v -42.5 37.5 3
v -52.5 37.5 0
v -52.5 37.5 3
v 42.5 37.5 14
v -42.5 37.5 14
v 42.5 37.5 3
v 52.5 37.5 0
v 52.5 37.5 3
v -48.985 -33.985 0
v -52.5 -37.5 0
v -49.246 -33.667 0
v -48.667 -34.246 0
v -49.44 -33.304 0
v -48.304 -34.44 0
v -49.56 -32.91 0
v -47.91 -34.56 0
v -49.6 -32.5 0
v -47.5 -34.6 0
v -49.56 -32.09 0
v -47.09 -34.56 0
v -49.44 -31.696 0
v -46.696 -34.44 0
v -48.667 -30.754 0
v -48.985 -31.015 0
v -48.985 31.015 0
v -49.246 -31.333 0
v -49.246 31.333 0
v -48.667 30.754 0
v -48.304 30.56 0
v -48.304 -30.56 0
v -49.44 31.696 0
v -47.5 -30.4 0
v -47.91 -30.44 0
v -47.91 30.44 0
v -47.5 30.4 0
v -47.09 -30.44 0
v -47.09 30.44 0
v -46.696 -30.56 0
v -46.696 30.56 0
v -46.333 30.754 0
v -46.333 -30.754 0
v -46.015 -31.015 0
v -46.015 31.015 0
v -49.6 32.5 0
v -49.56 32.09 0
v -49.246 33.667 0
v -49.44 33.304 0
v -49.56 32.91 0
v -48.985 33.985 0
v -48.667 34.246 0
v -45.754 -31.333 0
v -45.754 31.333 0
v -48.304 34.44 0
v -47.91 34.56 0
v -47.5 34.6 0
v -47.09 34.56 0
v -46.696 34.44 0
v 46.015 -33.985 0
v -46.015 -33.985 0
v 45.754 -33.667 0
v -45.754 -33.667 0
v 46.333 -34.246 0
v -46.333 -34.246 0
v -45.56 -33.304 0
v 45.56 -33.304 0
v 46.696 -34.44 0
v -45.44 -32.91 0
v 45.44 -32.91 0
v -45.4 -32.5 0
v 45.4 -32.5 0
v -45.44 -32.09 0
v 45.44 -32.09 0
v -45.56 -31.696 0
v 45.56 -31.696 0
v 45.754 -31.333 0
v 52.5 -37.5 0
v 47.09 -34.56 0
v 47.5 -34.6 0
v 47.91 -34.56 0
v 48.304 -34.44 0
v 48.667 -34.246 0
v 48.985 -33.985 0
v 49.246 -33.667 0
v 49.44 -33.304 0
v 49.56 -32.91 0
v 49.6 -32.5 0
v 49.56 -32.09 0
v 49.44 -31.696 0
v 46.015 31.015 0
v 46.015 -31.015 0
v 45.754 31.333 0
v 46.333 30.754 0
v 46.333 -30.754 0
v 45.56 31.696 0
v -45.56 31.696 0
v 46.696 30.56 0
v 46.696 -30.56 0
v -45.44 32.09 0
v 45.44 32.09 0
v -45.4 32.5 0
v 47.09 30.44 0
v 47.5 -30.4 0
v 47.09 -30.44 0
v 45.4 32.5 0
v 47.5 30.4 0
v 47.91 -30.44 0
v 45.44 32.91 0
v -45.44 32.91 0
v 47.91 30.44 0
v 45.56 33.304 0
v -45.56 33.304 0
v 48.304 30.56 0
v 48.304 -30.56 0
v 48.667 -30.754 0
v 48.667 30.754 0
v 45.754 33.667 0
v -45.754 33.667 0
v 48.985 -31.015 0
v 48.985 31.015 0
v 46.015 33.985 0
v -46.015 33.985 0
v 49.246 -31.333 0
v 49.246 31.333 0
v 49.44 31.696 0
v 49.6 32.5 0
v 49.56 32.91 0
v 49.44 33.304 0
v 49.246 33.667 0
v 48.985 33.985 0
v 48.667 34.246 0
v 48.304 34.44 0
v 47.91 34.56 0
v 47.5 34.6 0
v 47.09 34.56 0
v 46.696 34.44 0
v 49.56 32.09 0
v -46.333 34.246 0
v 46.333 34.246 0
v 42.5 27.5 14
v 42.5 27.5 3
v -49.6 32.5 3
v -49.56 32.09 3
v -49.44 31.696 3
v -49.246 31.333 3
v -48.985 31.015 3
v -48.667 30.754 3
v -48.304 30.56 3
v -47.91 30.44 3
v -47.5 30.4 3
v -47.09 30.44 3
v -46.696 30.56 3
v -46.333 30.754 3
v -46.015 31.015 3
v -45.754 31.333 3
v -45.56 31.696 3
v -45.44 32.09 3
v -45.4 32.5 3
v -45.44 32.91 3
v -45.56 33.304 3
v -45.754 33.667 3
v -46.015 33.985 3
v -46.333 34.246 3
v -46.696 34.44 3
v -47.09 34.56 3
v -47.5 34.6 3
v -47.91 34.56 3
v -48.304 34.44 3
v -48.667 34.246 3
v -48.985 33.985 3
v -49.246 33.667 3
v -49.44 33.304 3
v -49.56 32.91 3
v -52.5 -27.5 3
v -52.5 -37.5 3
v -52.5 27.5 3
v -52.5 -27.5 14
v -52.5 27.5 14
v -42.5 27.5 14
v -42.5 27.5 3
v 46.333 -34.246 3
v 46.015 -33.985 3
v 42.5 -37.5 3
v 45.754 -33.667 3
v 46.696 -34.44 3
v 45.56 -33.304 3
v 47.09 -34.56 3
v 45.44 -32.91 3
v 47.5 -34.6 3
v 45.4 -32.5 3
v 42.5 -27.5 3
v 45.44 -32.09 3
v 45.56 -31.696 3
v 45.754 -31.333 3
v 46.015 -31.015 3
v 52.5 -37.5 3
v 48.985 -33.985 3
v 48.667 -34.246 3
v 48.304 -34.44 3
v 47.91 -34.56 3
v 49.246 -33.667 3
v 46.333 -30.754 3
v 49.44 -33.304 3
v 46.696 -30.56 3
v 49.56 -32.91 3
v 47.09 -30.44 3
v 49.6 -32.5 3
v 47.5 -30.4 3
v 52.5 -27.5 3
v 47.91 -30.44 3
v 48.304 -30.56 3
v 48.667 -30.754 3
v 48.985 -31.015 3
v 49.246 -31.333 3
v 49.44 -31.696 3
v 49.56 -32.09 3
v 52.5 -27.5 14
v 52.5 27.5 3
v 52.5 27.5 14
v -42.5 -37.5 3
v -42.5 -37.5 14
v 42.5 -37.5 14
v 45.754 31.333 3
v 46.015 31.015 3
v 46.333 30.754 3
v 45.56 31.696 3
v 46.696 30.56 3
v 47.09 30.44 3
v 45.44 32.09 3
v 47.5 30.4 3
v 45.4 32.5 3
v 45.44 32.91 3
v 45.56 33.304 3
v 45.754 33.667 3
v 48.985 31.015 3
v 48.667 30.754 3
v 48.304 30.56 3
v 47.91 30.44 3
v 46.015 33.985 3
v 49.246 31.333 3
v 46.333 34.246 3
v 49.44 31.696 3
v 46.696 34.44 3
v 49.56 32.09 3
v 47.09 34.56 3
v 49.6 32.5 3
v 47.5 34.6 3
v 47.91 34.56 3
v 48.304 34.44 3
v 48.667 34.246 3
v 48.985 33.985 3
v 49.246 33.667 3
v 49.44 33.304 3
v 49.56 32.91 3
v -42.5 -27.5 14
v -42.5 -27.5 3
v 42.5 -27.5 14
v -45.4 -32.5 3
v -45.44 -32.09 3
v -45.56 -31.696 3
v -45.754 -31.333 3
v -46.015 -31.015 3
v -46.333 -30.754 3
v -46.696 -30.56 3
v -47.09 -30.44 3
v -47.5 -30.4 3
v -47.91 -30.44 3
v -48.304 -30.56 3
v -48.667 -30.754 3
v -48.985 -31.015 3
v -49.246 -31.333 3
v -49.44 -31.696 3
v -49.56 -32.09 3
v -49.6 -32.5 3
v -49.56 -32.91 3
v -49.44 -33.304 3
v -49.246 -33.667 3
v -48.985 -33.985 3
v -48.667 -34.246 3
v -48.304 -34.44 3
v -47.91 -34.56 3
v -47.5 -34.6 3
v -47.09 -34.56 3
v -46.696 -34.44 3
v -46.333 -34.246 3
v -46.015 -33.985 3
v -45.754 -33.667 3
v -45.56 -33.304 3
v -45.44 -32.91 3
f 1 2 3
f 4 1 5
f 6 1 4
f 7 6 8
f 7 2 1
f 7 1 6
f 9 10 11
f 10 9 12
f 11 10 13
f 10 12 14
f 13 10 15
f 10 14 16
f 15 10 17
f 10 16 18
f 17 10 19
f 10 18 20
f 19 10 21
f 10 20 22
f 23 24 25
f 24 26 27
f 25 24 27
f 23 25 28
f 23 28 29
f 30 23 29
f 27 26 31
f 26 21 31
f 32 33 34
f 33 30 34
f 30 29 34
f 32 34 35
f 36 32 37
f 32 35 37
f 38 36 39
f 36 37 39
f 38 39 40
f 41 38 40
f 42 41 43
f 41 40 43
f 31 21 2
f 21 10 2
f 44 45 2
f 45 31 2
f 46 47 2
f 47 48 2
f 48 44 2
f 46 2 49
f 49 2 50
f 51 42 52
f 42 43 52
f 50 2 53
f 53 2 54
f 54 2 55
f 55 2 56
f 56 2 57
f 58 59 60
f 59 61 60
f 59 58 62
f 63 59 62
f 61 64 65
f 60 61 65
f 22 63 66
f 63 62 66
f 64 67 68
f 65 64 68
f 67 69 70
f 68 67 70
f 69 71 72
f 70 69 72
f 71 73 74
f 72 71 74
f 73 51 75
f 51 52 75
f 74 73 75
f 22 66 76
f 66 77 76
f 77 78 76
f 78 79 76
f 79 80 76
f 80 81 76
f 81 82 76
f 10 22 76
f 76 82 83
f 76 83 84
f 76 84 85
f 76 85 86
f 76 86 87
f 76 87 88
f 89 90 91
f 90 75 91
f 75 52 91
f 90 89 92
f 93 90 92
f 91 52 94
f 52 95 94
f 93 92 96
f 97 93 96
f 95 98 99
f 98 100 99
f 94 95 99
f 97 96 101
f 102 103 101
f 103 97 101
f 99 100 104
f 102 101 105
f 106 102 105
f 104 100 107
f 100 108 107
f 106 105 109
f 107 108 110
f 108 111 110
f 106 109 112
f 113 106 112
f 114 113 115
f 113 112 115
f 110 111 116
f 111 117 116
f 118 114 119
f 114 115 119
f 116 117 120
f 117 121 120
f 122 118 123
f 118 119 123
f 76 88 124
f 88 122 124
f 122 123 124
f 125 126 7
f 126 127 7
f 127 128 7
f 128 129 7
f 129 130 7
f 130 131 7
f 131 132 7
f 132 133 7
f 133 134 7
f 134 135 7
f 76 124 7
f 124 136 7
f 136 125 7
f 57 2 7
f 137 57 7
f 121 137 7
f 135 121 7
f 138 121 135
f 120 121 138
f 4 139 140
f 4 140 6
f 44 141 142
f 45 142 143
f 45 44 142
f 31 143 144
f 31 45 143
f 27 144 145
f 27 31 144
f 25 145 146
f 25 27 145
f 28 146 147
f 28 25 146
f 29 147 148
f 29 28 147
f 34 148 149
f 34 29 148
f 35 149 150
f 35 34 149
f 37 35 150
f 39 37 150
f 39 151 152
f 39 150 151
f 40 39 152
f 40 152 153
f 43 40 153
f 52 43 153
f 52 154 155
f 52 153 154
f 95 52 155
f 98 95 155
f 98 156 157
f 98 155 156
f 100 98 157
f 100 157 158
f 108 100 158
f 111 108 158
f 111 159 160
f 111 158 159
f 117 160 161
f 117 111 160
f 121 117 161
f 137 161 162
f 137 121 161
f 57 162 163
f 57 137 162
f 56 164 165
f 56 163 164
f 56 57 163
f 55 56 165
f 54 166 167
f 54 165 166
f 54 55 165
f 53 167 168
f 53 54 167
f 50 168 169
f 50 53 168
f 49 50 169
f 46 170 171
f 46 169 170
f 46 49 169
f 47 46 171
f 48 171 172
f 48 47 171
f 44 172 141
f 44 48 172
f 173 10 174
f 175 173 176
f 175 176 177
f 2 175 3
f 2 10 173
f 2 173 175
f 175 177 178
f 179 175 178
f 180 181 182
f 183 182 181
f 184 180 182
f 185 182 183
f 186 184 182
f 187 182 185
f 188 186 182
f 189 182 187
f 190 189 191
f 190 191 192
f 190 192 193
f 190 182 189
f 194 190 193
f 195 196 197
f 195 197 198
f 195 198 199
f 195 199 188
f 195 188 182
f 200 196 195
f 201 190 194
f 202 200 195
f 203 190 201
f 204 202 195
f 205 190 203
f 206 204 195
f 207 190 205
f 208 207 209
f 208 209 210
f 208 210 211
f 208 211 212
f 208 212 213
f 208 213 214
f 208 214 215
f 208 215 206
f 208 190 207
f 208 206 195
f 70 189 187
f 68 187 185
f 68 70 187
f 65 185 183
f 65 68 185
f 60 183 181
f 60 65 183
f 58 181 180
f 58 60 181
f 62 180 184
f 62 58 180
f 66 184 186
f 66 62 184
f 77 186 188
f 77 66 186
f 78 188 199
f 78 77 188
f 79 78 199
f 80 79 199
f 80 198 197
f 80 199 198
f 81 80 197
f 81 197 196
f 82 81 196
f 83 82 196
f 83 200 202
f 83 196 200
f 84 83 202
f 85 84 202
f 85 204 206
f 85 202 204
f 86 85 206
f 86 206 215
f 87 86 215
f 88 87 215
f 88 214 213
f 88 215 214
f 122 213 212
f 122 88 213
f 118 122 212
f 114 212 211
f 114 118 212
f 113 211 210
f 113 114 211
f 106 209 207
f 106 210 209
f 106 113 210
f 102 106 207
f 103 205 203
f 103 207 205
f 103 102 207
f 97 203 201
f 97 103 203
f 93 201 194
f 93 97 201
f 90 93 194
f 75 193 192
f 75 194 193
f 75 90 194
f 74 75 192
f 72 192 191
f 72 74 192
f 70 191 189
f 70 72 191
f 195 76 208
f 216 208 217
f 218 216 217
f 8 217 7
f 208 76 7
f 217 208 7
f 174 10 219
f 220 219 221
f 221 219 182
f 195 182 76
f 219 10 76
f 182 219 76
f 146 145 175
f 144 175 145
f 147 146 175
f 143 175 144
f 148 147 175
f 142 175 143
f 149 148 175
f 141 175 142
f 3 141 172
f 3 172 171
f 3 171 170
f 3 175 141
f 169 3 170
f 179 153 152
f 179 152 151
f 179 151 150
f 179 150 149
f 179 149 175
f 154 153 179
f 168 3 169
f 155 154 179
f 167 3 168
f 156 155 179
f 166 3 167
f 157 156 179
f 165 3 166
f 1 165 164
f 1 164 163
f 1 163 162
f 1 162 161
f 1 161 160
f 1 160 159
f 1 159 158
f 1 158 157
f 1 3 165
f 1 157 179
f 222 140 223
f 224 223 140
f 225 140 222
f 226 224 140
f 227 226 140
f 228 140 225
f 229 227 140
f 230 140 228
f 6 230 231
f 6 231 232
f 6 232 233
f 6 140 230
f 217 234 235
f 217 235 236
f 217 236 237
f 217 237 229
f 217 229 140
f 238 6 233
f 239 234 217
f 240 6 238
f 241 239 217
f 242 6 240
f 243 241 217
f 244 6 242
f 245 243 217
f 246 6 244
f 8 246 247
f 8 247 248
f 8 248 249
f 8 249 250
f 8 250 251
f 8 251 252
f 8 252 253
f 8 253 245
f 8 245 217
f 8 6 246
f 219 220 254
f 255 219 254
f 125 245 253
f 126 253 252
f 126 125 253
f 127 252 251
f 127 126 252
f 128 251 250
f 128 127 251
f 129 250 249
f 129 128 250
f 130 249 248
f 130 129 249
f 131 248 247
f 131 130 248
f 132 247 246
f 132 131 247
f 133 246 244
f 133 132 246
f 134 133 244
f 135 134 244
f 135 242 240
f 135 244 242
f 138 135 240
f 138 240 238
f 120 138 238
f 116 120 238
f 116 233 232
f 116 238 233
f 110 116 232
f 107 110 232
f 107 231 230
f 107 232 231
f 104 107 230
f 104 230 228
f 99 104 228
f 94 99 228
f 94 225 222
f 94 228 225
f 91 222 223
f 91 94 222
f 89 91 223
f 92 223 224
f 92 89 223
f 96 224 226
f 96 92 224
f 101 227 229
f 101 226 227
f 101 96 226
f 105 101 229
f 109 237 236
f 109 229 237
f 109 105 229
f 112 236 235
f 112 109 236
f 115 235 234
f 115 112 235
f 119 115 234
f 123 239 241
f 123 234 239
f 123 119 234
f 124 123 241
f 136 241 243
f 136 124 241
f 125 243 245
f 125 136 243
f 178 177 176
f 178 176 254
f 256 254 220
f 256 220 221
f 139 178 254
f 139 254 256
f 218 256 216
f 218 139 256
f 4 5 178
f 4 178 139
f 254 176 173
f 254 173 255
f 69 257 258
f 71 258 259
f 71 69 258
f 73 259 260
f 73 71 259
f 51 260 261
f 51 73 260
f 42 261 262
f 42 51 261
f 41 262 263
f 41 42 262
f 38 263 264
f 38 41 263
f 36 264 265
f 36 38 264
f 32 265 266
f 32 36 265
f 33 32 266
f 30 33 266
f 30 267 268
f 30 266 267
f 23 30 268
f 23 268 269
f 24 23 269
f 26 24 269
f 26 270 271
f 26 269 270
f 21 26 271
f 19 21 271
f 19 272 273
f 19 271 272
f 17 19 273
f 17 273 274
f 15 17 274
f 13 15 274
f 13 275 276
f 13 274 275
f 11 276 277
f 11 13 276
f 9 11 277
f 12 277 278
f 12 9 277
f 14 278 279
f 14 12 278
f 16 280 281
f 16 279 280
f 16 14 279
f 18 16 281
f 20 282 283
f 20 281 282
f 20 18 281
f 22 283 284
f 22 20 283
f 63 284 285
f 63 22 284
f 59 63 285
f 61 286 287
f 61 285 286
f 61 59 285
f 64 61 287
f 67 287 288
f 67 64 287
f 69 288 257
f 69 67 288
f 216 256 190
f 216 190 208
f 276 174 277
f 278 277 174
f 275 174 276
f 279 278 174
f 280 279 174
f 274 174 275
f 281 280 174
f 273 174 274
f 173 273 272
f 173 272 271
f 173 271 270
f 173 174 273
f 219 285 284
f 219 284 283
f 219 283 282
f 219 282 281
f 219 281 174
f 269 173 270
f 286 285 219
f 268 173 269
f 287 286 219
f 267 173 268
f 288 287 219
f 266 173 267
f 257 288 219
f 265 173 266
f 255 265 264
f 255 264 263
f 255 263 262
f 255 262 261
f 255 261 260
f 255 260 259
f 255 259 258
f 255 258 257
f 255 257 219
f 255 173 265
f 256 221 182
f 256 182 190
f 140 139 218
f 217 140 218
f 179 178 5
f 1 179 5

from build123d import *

# Parameters (mm, degrees)
ESQUISSE1_W             = 105
ESQUISSE1_H             = 75
ESQUISSE1_R             = 2.1
BOSS_EXTRU_1_DEPTH      = 14
ESQUISSE3_W             = 10
ESQUISSE3_H             = 10
ENL_V_MAT_EXTRU_1_DEPTH = 11


with BuildPart() as part:
    # Esquisse1 → Boss.-Extru.1 (new body)
    with BuildSketch(Plane.XY):
        Rectangle(ESQUISSE1_W, ESQUISSE1_H)
        with Locations((47.5, 32.5)):
            Circle(ESQUISSE1_R, mode=Mode.SUBTRACT)
        with Locations(Location((-47.5, 32.5, 0), (0, 0, 180))):
            Circle(ESQUISSE1_R, mode=Mode.SUBTRACT)
        with Locations(Location((47.5, -32.5, 0), (0, 0, 180))):
            Circle(ESQUISSE1_R, mode=Mode.SUBTRACT)
        with Locations((-47.5, -32.5)):
            Circle(ESQUISSE1_R, mode=Mode.SUBTRACT)
    extrude(amount=BOSS_EXTRU_1_DEPTH)

    # Esquisse3 → Enlèv. mat.-Extru.1 (cut)
    with BuildSketch(Plane.XY.offset(14)):
        with Locations((47.5, 32.5)):
            Rectangle(ESQUISSE3_W, ESQUISSE3_H)
        with Locations((-47.5, 32.5)):
            Rectangle(ESQUISSE3_W, ESQUISSE3_H)
        with Locations((-47.5, -32.5)):
            Rectangle(ESQUISSE3_W, ESQUISSE3_H)
        with Locations((47.5, -32.5)):
            Rectangle(ESQUISSE3_W, ESQUISSE3_H)
    extrude(amount=-ENL_V_MAT_EXTRU_1_DEPTH, mode=Mode.SUBTRACT)


solid = part.part
